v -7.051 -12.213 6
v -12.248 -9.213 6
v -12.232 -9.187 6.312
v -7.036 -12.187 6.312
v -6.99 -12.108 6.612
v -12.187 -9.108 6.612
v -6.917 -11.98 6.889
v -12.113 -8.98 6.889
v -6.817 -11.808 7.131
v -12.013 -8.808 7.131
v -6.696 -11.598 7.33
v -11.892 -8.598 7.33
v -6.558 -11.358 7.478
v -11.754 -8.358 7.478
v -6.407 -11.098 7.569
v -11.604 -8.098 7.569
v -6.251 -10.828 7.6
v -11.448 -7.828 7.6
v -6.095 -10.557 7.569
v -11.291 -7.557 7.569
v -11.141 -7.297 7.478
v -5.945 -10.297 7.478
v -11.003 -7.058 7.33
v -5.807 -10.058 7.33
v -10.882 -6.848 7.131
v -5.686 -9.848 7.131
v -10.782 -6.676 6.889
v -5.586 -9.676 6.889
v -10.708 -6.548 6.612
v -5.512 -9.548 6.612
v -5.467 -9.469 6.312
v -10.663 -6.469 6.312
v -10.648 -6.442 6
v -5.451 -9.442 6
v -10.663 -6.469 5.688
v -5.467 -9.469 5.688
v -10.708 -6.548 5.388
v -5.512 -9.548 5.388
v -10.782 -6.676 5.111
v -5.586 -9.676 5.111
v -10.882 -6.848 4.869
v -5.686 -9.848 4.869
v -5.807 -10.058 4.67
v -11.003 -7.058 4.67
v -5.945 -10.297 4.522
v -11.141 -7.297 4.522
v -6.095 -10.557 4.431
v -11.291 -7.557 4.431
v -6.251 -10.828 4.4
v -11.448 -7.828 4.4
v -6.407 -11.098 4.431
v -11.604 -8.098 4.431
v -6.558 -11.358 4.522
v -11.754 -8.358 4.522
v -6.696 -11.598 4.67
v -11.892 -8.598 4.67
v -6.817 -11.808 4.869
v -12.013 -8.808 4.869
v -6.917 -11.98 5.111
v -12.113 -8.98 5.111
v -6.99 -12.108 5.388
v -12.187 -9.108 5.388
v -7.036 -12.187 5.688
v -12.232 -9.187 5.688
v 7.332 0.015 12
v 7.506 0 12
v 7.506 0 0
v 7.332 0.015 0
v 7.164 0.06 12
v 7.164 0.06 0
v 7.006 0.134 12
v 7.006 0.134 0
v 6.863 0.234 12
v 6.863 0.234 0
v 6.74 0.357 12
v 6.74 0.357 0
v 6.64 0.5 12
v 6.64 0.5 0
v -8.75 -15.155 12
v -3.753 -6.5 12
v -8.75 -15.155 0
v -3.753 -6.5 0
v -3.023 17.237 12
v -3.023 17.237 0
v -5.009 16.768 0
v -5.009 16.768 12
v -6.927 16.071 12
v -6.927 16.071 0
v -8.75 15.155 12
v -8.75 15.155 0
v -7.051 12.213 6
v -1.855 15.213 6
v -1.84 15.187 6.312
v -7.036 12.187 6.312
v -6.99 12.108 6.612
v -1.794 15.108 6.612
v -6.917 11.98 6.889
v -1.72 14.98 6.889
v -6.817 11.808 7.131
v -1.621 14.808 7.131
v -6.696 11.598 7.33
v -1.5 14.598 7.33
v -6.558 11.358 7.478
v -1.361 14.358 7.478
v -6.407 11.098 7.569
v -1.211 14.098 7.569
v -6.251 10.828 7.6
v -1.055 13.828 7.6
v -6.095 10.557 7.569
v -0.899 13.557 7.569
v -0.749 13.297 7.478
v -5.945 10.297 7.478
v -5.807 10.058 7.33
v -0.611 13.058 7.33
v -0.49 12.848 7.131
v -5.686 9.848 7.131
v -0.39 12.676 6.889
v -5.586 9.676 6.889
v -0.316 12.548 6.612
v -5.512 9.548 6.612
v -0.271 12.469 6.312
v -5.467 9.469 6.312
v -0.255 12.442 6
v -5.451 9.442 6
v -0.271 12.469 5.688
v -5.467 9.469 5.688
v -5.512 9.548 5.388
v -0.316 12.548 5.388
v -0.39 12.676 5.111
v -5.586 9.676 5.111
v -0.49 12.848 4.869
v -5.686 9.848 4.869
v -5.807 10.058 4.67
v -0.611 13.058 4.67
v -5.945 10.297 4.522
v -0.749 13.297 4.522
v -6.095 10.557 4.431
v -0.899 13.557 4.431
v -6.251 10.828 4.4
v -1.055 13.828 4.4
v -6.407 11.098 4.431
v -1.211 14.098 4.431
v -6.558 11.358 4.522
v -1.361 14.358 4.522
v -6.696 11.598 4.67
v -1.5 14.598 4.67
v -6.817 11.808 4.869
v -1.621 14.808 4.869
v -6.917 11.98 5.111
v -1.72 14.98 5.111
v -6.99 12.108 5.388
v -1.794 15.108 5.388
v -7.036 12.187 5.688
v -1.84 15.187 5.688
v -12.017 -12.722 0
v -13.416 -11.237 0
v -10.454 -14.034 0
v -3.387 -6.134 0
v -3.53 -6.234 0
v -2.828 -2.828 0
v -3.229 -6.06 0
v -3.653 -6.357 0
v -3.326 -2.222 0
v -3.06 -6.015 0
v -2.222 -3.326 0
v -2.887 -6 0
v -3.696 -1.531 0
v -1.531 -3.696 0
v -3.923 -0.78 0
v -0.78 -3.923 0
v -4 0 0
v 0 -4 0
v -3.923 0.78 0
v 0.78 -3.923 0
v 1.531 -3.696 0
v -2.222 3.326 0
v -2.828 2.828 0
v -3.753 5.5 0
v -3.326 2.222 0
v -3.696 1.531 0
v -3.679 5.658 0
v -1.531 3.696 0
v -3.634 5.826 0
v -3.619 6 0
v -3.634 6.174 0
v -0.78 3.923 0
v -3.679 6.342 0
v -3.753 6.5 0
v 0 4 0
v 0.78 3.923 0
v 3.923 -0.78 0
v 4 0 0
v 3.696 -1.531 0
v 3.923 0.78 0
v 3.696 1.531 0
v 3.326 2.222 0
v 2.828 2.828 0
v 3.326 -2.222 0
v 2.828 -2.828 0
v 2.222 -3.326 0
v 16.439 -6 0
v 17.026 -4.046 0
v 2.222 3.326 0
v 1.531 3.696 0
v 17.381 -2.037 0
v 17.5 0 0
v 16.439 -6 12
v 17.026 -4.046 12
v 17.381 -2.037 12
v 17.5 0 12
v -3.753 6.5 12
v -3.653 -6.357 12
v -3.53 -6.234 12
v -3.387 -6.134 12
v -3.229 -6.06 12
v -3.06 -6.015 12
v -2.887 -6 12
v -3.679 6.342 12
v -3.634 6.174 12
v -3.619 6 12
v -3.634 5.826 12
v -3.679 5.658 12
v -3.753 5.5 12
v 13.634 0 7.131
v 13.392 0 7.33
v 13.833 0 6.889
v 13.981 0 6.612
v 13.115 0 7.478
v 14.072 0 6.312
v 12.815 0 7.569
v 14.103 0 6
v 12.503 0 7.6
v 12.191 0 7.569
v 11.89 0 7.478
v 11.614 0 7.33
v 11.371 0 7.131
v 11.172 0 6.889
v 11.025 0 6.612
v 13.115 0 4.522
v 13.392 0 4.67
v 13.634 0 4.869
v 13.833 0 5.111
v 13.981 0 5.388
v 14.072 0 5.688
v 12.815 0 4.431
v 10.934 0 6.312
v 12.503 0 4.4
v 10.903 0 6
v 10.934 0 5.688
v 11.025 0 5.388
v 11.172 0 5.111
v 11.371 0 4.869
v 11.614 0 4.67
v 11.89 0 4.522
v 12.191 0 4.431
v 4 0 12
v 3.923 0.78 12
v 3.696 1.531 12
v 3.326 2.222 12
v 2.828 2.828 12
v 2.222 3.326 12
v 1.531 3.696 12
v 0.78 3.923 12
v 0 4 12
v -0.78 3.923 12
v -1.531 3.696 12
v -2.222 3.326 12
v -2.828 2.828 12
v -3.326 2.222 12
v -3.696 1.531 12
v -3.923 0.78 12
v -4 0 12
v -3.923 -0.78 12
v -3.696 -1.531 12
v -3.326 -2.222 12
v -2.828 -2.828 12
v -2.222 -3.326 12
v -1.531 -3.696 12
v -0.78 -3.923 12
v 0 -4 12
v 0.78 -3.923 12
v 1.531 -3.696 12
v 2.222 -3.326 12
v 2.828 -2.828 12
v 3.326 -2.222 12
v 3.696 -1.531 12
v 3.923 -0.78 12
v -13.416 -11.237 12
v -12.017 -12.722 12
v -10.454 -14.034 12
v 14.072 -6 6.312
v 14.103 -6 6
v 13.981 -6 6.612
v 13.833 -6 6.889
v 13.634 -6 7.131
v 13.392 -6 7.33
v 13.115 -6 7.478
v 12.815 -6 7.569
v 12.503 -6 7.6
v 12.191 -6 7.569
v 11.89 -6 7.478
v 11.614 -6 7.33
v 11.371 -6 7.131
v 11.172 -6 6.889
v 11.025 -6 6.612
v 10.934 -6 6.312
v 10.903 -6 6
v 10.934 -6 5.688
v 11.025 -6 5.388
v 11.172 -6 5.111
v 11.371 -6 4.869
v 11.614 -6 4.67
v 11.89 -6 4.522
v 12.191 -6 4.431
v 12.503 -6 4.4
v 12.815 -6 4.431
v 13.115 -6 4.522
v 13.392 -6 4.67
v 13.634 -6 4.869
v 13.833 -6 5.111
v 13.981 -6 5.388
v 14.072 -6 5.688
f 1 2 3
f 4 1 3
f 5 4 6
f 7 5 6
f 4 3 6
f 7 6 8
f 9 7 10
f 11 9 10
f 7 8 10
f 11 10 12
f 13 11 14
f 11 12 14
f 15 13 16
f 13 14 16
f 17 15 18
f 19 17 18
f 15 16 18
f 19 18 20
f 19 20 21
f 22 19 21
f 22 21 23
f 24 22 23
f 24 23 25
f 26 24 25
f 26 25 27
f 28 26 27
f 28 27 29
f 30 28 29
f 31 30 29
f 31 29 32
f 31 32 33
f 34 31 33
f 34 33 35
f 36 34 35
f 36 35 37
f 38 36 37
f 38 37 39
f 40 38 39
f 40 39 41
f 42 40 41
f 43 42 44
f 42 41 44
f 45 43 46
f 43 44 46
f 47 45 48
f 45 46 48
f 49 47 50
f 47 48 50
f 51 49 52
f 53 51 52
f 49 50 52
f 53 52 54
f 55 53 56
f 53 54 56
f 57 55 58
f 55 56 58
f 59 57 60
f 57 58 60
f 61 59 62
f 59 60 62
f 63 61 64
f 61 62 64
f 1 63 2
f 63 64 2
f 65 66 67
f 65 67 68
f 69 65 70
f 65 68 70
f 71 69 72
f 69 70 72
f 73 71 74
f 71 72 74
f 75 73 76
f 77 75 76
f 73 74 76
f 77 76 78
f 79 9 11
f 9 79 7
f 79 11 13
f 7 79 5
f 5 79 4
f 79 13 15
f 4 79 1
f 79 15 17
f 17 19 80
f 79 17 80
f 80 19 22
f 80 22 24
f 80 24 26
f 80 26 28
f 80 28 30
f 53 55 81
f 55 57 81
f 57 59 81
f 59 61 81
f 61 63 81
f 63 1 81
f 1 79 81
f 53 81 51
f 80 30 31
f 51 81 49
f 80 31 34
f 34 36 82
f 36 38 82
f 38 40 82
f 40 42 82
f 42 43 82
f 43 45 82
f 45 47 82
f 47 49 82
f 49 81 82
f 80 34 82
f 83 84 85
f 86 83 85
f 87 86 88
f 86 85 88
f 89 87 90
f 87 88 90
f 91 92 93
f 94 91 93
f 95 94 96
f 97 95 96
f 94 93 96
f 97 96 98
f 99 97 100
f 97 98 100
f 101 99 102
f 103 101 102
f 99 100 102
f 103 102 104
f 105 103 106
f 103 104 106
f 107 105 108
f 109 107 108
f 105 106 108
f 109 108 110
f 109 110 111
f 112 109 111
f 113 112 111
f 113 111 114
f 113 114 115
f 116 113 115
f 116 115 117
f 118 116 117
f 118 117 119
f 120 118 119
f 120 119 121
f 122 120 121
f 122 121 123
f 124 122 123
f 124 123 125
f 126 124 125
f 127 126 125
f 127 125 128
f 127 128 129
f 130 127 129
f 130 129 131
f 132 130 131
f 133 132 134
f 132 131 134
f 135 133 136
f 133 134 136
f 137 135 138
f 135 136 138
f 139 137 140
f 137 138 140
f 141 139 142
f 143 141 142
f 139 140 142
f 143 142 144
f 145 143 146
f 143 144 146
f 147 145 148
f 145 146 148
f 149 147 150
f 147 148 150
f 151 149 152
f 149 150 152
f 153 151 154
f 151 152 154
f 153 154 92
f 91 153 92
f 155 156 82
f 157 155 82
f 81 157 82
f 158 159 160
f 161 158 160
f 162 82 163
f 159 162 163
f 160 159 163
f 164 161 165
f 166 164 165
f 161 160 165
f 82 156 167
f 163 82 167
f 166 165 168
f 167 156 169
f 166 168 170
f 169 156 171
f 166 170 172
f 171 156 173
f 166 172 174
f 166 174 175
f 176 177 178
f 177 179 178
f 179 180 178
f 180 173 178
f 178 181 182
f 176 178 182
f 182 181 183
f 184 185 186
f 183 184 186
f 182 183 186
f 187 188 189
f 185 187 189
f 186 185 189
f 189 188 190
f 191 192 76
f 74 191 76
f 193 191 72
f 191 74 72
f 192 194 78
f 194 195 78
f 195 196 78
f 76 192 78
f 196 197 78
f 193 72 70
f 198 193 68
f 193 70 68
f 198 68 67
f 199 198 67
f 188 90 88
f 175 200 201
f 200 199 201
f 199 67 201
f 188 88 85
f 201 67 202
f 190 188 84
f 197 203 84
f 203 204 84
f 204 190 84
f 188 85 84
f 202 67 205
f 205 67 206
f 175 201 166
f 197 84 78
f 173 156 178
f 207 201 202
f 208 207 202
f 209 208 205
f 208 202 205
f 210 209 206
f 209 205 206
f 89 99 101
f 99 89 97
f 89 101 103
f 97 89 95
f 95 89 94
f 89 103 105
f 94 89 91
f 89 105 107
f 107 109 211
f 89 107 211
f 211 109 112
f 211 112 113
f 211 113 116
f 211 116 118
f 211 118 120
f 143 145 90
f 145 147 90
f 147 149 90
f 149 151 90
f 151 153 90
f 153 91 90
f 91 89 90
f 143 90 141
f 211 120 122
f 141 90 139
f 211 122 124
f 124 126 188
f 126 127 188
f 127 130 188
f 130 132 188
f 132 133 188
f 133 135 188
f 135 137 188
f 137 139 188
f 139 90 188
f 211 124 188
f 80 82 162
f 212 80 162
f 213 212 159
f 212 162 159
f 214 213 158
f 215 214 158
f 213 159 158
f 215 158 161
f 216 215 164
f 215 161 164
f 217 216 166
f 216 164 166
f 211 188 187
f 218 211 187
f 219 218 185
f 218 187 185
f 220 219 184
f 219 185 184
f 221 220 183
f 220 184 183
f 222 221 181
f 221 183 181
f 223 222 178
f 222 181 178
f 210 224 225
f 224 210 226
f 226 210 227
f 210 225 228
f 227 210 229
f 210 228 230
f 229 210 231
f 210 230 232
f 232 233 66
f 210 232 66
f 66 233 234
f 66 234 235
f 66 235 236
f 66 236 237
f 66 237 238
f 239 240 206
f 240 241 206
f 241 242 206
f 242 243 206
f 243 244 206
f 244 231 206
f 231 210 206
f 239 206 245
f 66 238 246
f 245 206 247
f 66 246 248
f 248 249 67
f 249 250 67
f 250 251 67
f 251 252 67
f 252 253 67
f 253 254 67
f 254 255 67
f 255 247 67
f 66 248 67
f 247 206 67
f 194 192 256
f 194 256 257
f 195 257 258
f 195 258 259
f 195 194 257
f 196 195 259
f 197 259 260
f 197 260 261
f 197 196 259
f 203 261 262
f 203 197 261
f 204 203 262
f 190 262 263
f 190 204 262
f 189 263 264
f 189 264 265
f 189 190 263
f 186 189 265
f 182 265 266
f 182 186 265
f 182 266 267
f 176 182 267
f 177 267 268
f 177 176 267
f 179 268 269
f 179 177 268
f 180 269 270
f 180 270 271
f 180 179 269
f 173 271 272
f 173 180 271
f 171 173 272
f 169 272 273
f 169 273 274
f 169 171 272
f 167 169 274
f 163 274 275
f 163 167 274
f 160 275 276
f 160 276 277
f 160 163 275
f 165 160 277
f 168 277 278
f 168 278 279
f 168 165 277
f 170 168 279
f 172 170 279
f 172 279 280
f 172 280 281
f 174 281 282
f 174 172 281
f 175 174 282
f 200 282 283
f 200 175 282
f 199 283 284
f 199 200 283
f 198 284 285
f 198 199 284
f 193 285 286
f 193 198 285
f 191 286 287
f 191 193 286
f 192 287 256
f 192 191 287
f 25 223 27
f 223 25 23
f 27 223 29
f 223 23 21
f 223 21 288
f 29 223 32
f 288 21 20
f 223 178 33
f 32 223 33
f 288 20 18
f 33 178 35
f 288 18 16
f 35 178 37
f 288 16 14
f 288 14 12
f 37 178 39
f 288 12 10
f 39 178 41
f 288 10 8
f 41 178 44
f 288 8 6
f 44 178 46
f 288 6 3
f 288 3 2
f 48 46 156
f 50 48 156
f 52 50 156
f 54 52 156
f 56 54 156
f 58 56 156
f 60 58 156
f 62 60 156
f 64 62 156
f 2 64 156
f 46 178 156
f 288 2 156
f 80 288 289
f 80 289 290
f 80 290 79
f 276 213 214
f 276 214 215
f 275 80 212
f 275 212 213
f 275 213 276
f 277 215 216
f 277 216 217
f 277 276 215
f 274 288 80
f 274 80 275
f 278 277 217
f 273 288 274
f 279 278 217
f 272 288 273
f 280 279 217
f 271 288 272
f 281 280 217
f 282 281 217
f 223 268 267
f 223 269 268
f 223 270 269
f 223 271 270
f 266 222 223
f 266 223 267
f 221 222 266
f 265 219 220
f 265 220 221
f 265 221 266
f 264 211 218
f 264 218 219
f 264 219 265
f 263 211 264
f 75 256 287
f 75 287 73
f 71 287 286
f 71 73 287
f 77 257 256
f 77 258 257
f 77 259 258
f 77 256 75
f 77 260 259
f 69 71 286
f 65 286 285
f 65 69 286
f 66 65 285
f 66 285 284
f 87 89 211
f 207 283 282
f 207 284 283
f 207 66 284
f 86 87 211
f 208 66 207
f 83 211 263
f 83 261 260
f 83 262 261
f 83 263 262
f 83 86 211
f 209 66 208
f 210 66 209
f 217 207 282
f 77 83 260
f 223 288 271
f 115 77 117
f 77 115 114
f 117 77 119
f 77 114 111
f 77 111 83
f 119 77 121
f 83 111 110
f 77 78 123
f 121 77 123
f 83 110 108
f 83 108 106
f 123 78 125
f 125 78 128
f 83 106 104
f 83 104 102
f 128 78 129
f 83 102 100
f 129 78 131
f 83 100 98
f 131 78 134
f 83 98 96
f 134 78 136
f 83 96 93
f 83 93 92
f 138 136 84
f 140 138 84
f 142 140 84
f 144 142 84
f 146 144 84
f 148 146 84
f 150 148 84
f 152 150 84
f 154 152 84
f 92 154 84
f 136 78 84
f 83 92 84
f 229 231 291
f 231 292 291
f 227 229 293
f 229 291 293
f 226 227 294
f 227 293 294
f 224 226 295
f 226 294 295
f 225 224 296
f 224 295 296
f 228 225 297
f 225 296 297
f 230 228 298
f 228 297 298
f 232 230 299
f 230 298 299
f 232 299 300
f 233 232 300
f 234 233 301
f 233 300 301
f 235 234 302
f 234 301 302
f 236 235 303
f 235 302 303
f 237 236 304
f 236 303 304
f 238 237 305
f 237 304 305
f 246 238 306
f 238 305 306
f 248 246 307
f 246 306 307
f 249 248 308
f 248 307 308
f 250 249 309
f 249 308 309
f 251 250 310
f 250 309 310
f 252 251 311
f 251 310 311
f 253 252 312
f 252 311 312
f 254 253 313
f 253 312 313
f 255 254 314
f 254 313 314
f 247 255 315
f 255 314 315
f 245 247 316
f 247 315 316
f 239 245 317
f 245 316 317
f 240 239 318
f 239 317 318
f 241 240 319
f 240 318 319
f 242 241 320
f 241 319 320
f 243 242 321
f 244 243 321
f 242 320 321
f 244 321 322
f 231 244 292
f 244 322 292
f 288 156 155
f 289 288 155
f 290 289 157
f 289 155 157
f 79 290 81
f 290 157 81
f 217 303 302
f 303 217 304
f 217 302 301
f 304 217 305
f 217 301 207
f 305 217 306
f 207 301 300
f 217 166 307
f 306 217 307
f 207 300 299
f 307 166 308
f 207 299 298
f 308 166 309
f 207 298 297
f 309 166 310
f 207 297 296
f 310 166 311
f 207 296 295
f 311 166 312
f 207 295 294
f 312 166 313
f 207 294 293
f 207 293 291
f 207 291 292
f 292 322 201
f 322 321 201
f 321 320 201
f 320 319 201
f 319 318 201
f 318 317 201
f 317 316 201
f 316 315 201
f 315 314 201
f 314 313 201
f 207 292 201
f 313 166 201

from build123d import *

# Parameters (mm, degrees)
F0_R            = 4
F1_DEPTH        = 12
F3_D            = 3.2
F3_DEPTH        = 6
F3_TIP          = 0.9613769904
F3_COPIES_COUNT = 3


# Not quite as in the source:
# - a pattern or mirror of a feature is missing from the dataset's text; its kind, count and spacing are read off the source's solid


with BuildPart() as f1:
    # F0 (on Top) → F1 (new body)
    with BuildSketch(Plane.XY):
        with BuildLine():
            Line((-2.8867513459, -6), (16.4392822228, -6))
            ThreePointArc((16.4392822228, -6), (17.2327803749, -3.0465194158), (17.5, 0))
            Line((17.5, 0), (7.5055534995, 0))
            ThreePointArc((7.5055534995, 0), (7.0055534995, 0.1339745962), (6.6395280957, 0.5))
            Line((6.6395280957, 0.5), (-3.0234886887, 17.2368360249))
            ThreePointArc((-3.0234886887, 17.2368360249), (-5.9780269803, 16.4472852904), (-8.75, 15.1554445662))
            Line((-8.75, 15.1554445662), (-3.7527767497, 6.5))
            ThreePointArc((-3.7527767497, 6.5), (-3.6188021535, 6), (-3.7527767497, 5.5))
            Line((-3.7527767497, 5.5), (-13.4157935341, -11.2368360249))
            ThreePointArc((-13.4157935341, -11.2368360249), (-11.2547533946, -13.4007658746), (-8.75, -15.1554445662))
            Line((-8.75, -15.1554445662), (-3.7527767497, -6.5))
            ThreePointArc((-3.7527767497, -6.5), (-3.3867513459, -6.1339745962), (-2.8867513459, -6))
        make_face()
        Circle(F0_R, mode=Mode.SUBTRACT)
    extrude(amount=F1_DEPTH)

    # F3
    with Locations(Plane(origin=(0, 0, 0), x_dir=(-1, 0, 0), z_dir=(0, 1, 0))):
        with Locations((-12.5027767497, 6)):
            f3 = Hole(F3_D / 2, depth=F3_DEPTH)
            with Locations((0, 0, -(F3_DEPTH + F3_TIP / 2))):  # 118° drill point
                Cone(0, F3_D / 2, F3_TIP, mode=Mode.SUBTRACT)

    # F3_copies: F3 ×3 about axis
    f3_copies_axis = Axis((0, 0, 0), (0, 0, 1))
    for i in range(1, F3_COPIES_COUNT):
        add(f3.rotate(f3_copies_axis, i * 360 / F3_COPIES_COUNT), mode=Mode.SUBTRACT)


solid = f1.part
